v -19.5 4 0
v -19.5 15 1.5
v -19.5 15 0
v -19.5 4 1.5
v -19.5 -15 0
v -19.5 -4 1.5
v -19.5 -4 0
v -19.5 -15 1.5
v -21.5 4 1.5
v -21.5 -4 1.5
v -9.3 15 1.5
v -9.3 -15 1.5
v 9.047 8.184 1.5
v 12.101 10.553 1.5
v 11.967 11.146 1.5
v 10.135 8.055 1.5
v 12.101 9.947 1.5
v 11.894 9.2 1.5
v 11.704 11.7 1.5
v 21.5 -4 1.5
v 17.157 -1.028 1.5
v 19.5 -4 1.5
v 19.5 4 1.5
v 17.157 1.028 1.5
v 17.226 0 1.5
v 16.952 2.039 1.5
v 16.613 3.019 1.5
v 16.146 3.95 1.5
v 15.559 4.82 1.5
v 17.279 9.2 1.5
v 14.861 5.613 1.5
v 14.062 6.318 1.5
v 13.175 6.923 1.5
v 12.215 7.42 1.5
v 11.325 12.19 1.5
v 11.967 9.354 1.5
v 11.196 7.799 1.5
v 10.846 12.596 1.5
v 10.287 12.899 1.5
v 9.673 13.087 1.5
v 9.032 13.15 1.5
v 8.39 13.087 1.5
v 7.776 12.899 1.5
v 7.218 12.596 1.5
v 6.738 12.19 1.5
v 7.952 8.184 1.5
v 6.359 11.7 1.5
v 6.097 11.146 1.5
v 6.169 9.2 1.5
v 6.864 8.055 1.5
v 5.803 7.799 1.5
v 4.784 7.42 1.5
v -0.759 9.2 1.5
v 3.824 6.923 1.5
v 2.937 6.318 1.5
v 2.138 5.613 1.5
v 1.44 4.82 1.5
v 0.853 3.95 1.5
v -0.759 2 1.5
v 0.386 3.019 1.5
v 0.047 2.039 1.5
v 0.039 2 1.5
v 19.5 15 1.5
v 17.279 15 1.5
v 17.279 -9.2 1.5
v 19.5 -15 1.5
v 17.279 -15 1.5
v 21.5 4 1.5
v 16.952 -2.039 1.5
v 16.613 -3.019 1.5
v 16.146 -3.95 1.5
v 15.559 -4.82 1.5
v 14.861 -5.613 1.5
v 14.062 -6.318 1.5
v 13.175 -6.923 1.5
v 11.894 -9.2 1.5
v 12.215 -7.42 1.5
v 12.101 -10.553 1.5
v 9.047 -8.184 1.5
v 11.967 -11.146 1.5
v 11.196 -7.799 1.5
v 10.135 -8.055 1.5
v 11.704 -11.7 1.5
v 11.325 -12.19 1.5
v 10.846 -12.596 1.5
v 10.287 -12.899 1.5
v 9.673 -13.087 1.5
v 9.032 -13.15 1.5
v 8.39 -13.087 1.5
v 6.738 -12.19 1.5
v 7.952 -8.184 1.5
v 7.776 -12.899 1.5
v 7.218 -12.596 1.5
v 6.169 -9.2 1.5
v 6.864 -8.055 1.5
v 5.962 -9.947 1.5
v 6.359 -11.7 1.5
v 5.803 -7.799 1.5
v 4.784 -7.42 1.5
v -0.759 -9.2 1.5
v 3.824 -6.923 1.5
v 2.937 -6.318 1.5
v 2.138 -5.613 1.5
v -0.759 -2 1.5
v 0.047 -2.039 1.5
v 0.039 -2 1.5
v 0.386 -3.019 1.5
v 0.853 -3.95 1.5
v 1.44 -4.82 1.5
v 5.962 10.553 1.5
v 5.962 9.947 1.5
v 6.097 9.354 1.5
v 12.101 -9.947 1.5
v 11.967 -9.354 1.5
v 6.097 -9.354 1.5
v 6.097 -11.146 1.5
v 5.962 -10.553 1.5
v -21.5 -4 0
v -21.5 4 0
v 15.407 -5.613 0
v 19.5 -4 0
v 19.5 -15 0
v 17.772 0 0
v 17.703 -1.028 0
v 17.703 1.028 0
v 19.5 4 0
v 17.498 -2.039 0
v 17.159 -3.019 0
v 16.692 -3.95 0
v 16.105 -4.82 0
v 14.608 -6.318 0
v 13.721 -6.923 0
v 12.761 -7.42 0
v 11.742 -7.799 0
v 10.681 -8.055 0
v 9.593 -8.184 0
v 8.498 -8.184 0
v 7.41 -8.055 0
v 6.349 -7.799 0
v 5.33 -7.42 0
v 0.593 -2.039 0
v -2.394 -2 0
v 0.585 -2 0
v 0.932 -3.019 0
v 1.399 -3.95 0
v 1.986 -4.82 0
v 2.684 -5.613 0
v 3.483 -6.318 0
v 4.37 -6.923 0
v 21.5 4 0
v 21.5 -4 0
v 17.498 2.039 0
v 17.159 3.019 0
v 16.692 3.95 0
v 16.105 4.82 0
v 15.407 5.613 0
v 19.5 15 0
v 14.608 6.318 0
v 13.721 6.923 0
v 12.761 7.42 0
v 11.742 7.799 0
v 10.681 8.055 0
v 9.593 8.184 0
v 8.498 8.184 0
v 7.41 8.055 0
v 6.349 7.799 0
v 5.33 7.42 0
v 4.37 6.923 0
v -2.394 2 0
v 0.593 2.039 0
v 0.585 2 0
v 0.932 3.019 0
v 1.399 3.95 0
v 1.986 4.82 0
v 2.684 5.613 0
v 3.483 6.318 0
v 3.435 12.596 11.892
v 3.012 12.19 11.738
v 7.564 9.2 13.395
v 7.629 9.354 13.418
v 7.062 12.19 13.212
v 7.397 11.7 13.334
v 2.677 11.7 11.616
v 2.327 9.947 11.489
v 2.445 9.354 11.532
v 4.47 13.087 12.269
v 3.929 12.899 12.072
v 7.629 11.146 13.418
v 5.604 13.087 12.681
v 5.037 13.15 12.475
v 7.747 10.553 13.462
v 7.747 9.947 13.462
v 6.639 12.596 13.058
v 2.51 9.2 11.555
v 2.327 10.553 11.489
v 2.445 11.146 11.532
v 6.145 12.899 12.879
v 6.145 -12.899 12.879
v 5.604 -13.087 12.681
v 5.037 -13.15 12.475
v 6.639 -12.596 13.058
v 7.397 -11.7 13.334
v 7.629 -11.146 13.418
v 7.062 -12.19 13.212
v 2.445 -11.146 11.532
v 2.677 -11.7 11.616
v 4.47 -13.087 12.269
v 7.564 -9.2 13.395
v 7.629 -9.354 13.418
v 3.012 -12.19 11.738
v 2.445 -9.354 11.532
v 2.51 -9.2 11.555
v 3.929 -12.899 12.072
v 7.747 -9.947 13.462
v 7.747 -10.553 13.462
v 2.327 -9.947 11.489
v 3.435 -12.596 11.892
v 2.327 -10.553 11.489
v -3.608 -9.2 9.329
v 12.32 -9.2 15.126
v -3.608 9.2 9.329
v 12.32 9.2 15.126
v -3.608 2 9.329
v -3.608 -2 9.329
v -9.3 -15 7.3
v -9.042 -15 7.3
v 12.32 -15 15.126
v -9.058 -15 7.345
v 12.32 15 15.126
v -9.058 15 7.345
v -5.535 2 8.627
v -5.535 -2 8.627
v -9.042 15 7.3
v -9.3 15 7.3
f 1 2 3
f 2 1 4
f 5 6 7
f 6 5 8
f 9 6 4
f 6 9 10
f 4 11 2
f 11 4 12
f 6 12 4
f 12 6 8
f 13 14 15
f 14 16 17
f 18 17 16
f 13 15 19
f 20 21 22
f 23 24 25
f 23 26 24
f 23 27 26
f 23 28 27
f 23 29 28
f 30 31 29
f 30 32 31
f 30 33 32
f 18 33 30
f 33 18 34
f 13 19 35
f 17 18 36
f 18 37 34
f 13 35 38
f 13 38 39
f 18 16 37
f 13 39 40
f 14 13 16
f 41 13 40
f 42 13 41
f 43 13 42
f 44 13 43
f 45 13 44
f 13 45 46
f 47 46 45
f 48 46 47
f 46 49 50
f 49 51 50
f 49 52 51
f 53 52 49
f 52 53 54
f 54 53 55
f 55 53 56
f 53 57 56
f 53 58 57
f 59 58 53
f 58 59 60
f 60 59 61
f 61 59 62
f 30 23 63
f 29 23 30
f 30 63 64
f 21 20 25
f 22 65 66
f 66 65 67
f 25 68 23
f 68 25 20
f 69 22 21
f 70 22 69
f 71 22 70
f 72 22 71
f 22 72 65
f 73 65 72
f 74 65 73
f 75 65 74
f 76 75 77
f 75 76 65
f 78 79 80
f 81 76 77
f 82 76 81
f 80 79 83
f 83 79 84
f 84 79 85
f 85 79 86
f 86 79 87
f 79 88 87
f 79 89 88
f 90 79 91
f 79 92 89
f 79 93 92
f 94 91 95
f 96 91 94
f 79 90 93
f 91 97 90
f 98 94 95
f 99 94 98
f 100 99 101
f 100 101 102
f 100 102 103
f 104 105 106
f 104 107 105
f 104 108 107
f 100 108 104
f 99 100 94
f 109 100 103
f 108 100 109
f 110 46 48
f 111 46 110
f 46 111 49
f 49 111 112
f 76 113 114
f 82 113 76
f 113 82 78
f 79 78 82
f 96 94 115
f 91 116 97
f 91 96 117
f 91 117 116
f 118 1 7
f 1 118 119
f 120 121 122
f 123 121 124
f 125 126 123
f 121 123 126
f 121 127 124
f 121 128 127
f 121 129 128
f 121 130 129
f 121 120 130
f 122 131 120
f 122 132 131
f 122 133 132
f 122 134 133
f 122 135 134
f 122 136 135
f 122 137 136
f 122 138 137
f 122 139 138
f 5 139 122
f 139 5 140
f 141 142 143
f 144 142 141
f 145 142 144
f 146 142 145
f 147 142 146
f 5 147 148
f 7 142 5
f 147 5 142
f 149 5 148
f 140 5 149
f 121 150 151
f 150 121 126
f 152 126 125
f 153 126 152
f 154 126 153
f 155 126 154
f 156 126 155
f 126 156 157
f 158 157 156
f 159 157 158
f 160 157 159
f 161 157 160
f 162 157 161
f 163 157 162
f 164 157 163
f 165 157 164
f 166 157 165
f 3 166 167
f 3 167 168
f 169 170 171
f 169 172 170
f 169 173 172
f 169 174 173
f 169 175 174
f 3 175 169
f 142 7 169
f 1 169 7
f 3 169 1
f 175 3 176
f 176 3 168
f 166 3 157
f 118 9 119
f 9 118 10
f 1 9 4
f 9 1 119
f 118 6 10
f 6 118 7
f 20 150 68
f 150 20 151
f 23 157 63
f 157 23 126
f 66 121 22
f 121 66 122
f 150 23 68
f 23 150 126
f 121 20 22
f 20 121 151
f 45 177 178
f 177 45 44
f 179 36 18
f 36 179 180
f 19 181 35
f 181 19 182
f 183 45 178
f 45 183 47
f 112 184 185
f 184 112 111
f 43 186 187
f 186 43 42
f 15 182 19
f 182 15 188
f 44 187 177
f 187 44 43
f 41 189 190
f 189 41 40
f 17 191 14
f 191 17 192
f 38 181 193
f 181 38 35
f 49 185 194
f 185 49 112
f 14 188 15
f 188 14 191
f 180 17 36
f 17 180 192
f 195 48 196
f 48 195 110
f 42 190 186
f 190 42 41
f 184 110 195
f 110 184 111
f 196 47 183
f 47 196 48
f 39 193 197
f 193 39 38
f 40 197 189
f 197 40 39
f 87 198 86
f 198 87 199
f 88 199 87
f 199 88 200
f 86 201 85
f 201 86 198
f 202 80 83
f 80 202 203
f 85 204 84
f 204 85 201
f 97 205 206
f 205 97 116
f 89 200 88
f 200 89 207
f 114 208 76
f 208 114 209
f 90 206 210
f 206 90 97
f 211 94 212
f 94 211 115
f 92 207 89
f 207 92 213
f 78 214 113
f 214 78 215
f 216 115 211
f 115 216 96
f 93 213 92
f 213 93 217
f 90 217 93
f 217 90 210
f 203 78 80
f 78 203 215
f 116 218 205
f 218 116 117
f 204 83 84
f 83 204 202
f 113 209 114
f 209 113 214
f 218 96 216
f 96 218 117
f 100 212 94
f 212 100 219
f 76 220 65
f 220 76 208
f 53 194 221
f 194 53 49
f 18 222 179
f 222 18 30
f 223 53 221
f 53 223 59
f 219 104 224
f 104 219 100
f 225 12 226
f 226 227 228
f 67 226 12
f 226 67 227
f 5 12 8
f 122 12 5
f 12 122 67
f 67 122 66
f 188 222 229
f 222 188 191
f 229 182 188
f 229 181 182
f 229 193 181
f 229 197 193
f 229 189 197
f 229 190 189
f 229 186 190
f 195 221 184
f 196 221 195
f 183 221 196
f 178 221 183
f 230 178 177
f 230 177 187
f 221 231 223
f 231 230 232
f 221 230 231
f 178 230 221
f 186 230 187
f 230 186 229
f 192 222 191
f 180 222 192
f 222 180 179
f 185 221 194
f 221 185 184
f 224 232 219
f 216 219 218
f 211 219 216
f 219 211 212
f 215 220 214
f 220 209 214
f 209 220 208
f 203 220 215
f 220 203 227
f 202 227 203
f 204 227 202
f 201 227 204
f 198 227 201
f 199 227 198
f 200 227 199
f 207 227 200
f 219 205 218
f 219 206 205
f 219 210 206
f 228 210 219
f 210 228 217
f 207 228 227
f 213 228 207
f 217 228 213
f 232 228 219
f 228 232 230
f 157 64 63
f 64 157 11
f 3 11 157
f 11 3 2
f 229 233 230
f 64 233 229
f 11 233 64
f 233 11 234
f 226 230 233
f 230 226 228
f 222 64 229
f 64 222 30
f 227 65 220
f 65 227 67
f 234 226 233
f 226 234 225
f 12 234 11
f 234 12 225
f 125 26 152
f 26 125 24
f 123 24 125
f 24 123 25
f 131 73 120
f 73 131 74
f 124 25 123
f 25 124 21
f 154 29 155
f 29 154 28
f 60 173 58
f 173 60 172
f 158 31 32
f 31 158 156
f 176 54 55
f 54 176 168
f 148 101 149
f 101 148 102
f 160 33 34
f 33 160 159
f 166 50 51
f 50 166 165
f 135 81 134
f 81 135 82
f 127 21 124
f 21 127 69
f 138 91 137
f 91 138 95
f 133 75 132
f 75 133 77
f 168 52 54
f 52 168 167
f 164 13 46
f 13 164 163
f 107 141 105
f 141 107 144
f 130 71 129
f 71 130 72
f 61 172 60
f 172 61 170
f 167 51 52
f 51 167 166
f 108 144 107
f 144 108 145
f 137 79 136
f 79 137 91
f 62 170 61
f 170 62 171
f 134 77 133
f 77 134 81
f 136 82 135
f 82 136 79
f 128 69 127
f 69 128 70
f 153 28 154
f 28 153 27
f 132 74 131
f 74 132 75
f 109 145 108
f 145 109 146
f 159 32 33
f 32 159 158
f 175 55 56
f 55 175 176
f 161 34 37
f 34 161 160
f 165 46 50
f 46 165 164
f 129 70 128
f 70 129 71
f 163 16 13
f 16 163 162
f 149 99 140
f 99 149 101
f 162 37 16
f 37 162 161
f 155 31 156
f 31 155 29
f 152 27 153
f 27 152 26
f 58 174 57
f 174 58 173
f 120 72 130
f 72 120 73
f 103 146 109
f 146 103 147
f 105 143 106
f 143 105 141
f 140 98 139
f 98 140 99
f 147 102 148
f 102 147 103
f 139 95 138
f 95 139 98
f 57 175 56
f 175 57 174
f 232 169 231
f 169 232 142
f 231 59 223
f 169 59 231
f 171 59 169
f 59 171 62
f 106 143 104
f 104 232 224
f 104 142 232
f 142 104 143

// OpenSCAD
// file: dronePlates.scad
/**
 * dronePlates.scad
 * Plate library
 *
 * GNU GPL V3
 * @author: Victor Potenciano
 */

m3Rad = 3.4/2;
cornerR = 4;

/**
 *
 */
module helperDisk(diameter) {
	cylinder(r = diameter/2, h = 0.6, $fn=20);
}

/**
 *
 */
module roundedRect(size, radius) {
	x = size[0];
	y = size[1];
	z = size[2];

	linear_extrude(height=z)
	hull() {
	// place 4 circles in the corners, with the given radius
	translate([(-x/2)+(radius/2), (-y/2)+(radius/2), 0]){ circle(r=radius); }
	translate([(x/2)-(radius/2), (-y/2)+(radius/2), 0]){ circle(r=radius); }
	translate([(-x/2)+(radius/2), (y/2)-(radius/2), 0]){ circle(r=radius); }
	translate([(x/2)-(radius/2), (y/2)-(radius/2), 0]){ circle(r=radius); }
	}
}

/**
 * rounded rectangle triangle with corner at origin
 */
module roundedTriangle(size, radius) {
	x = size[0];
	y = size[1];
	z = size[2];

	linear_extrude(height=z)
	hull() {
	translate([radius, radius, 0]){ circle(r=radius); }
	translate([x-radius, radius, 0]){ circle(r=radius); }
	translate([radius, y-radius, 0]){ circle(r=radius); }
	}
}

/**
 *
 */
module roundRectPlate(w, l, plateThick=3) {
	difference(){
		roundedRect([l+m3Rad*1.75,w+m3Rad*1.75,plateThick], cornerR);
		translate([l/2, w/2, -0.5]) { cylinder(h = plateThick+1, r = m3Rad, $fn=30); }
		translate([-l/2, w/2, -0.5]) { cylinder(h = plateThick+1, r = m3Rad, $fn=30); }
		translate([l/2, -w/2, -0.5]) { cylinder(h = plateThick+1, r = m3Rad, $fn=30); }
		translate([-l/2, -w/2, -0.5]) { cylinder(h = plateThick+1, r = m3Rad, $fn=30); }
	}
}

/**
 *
 */
module crossSquarePlate(l, thick=3) {
	inDist = cornerR*2+4;
	trianL = sqrt((l*l)/2)-inDist;
	centerR = 4;

	difference(){
		roundRectPlate(l, l, thick);
		translate([0, centerR, -0.5]) { 
			rotate([0,0,45]){ roundedTriangle([trianL,trianL,thick+1], cornerR-2); }
		}
		translate([0, -centerR, -0.5]) { 
			rotate([0,0,225]){ roundedTriangle([trianL,trianL,thick+1], cornerR-2); }
		}
		translate([-centerR, 0, -0.5]) { 
			rotate([0,0,135]){ roundedTriangle([trianL,trianL,thick+1], cornerR-2); }
		}
		translate([centerR, 0, -0.5]) { 
			rotate([0,0,-45]){ roundedTriangle([trianL,trianL,thick+1], cornerR-2); }
		}
	}
}

/**
 *
 */
module hShapePlate(w, l, thick=4) {
	inDist = cornerR*2+1;

	difference(){
		roundRectPlate(w, l, thick);
		translate([0, w/4, -0.5]) { roundedRect([l-inDist,w/2-inDist,thick+1], cornerR-2); }
		translate([0, -w/4, -0.5]) { roundedRect([l-inDist,w/2-inDist,thick+1], cornerR-2); }
	}
}

/**
 *
 */
module motorCircleMount(inDia, outDia, thick=3, extraH=false, d1=19, d2=16, holeR=m3Rad ) {
	difference(){
		cylinder(h = thick, r = outDia/2, $fn=30);
		motorCircleMountHoles(inDia, outDia, thick, extraH, d1=d1, d2=d2, holeR=holeR);
	}
}

/**
 *
 */
module motorCircleMountHoles(inDia, outDia, thick=3, extraH=false, d1=19, d2=16, d3=25, holeR=m3Rad) {
	translate([0, 0, -0.5]) { cylinder(h = thick+1, r = inDia/2, $fn=30); }

	for(i=[0:3]) {
		rotate([0,0,90*i]){
		translate([d1/2, 0, -0.5]) cylinder(h = thick+1, r = holeR, $fn=20);
		translate([d2/2, 0, -0.5]) cylinder(h = thick+1, r = holeR, $fn=20);
		translate([d2/2, -holeR, -0.5]) cube(size = [(d1-d2)/2,holeR*2,thick+1]);
		}
	}
	
	if(extraH==true){	
		for(i=[-1,1]) translate([i*d3/2, 0, -0.5]) { cylinder(h = thick+1, r = holeR, $fn=30); }
	}
}

/**
 *
 */
module motorRectMount(w, l, inDia, thick=3) {
	d1=19;
	d2=16;

	difference(){
		roundRectPlate(w, l, thick);
		translate([0, 0, -0.5]) { cylinder(h = thick+1, r = inDia/2, $fn=30); }
		translate([0, d1/2, -0.5]) { cylinder(h = thick+1, r = m3Rad, $fn=30); }
		translate([0, -d1/2, -0.5]) { cylinder(h = thick+1, r = m3Rad, $fn=30); }
		translate([d2/2, 0, -0.5]) { cylinder(h = thick+1, r = m3Rad, $fn=30); }
		translate([-d2/2, 0, -0.5]) { cylinder(h = thick+1, r = m3Rad, $fn=30); }
	}
}

/**
 *
 */
module tube(inDia, outDia, height) {
	difference(){
		cylinder(h = height, r = outDia/2, $fn=50);
		translate([0, 0, -0.5]) { cylinder(h = height+1, r = inDia/2, $fn=30); }
	}
}

/**
 *
 */
module squareTube(inDia, outDia, height) {
	translate([0,0,height/2]){
	difference(){
		cube(size = [outDia,outDia,height], center = true);
		cube(size = [inDia,inDia,height+1], center = true);
	}
	}
}

/**
 *
 */
module djiFlamewheelHoles(height) {
	a = 23;
	b = 16;
	c = 19.5;
	
	translate([a/2, c/2, 0]) { cylinder(h = height, r = m3Rad, $fn=30); }
	translate([-a/2, c/2, 0]) { cylinder(h = height, r = m3Rad, $fn=30); }
	translate([b/2, -c/2, 0]) { cylinder(h = height, r = m3Rad, $fn=30); }
	translate([-b/2, -c/2, 0]) { cylinder(h = height, r = m3Rad, $fn=30); }
}

/**
 *
 */
module djiFlamewheelHolesBotton(height) {
	a1 = 21;
	c = 19.5;
	
	translate([a1/2, c/2, 0]) { cylinder(h = height, r = m3Rad, $fn=30); }
	translate([-a1/2, c/2, 0]) { cylinder(h = height, r = m3Rad, $fn=30); }
}

/**
 *
 */
module propeller(size){
union(){
difference(){
	cylinder(h = 3, r = size/2, center=true, $fn=30);
	cylinder(h = 3.1, r = size/2-2, center=true, $fn=30); 
}
for( i = [-1,1] ){
rotate([0,0,45*i]){ cube(size = [size,4,1], center = true); }
}
}
}

/**
 *
 */
module slot(length, height, rad){
for(i=[-1,1]) translate([i*length/2,0,0]) cylinder(h = height, r = rad, $fn=30);
translate([0,0,height/2]) cube(size = [length,rad*2,height], center = true);
}

 

////////////////////////
// Examples:
////////////////////////

motorCircleMount(8, 25, 3.5);

//roundedRect([50,50,3], 4);

//hShapePlate(79, 25);

//rotate([0,0,45]){roundedTriangle([40,40,3], 4);}

//crossSquarePlate(45, 4);

/*
union(){
motorRectMount(21, 18, 8, 4);
translate([9, 10.5, 0]) {tube(m3Rad*2, 6.5, 6);}
}
*/

/*
difference(){
union(){
hShapePlate(50, 30, 3.5);
translate([-4,-25,0]){cube(size = [8,50,3.5]);}
rotate([0, 0, 45]) {motorCircleMount(8, 35, 3.5);}
}
cylinder(h = 10, r = 4, $fn=100, center=true);
}
*/

//rotate([90,0,0]){ tube(5,10,20); }
//translate([20,0,0]){ squareTube(5, 10, 20); }
// main file
/**
 * lt210 fpv camera mount
 */
 
use <dronePlates.scad>;

thick = 1.5;
hubSqH=17;
tolerance=0.4;
angle = 20;

RENDER_AUX=false;

/***
difference(){
    union(){
    import("qav210_fpvcam.stl", convexity=4);
    translate([0,7,5]) cube(size=[19,4,9], center=true);
    }
    
    translate([0,-13.5,8.5]) cube(size=[16.75,2,10], center=true);
    translate([0,5,0]) cube(size=[2.5,2.5,20], center=true);
}
***/

/**
 *
 */
module fpvCam(){
    union(){
    cube([32,32,1.5], center=true);
    translate([0,0,4]) cube([18,18,8], center=true);
    cylinder(r=8.5, h=25, $fn=20);
    }
}

/**
 *
 */
module walls(){
    dist = 35/cos(25);
    for(i=[-1,1]){
         rotate([0,25,0]) translate([i*dist/2,0,20/2]) cube([1.5,32,40],center=true);
    }
}

/**
 *
 */
module cameraHub(tolerance=0){
sqL = 18;

translate([0,0,hubSqH/2]) cube(size=[sqL+tolerance,sqL+tolerance,hubSqH+tolerance], center=true);
cylinder(r=7.5+(tolerance/2), h=16, $fn=20);
for(i=[-1,1]) translate([i*10.25,0,0]) cylinder(h=hubSqH,r=2.7+(tolerance/2),$fn=30);
translate([0,0,16/2])cube(size=[3+tolerance,sqL+4+tolerance,16], center=true);
}//end module

/**
 *
 */
module housing(){
difference(){
cube(size=[30,30,hubSqH-2], center=true);
scale([1,1,1.1]) translate([0,0,-hubSqH/2]) cameraHub(tolerance=tolerance);
translate([0,13,0]) cube(size=[32+1,10+0.5,hubSqH], center=true);
}
}//end module

if(RENDER_AUX){
    color("grey") translate([4,0,13]) rotate([0,180-angle,0]) fpvCam();
    color("pink", alpha=0.2) walls();
}

color(alpha=0.4)
difference(){
    union(){
        translate([0,0,thick/2]) cube(size=[39,30,thick], center=true);
        translate([-6.8,0,7.3/2]) cube(size=[5,30,7.3], center=true);
        for(i=[-1,1]) translate([i*20.5,0,thick/2]) cube(size=[2,8,thick], center=true);
        rotate([0,-angle,0]) translate([9,0,hubSqH/2-6]) rotate([0,0,-90]) housing();
    }
    
    rotate([0,-angle,0]){
    translate([8.5,0,0]) rotate([0,0,0]) cylinder(r=8.2, h=20, center=true, $fn=50);
    translate([-0.75,0,0]) cube(size=[3,4,25], center=true);
    }
    
    translate([0,0,-20/2]) cube([50,50,20], center=true);
}
